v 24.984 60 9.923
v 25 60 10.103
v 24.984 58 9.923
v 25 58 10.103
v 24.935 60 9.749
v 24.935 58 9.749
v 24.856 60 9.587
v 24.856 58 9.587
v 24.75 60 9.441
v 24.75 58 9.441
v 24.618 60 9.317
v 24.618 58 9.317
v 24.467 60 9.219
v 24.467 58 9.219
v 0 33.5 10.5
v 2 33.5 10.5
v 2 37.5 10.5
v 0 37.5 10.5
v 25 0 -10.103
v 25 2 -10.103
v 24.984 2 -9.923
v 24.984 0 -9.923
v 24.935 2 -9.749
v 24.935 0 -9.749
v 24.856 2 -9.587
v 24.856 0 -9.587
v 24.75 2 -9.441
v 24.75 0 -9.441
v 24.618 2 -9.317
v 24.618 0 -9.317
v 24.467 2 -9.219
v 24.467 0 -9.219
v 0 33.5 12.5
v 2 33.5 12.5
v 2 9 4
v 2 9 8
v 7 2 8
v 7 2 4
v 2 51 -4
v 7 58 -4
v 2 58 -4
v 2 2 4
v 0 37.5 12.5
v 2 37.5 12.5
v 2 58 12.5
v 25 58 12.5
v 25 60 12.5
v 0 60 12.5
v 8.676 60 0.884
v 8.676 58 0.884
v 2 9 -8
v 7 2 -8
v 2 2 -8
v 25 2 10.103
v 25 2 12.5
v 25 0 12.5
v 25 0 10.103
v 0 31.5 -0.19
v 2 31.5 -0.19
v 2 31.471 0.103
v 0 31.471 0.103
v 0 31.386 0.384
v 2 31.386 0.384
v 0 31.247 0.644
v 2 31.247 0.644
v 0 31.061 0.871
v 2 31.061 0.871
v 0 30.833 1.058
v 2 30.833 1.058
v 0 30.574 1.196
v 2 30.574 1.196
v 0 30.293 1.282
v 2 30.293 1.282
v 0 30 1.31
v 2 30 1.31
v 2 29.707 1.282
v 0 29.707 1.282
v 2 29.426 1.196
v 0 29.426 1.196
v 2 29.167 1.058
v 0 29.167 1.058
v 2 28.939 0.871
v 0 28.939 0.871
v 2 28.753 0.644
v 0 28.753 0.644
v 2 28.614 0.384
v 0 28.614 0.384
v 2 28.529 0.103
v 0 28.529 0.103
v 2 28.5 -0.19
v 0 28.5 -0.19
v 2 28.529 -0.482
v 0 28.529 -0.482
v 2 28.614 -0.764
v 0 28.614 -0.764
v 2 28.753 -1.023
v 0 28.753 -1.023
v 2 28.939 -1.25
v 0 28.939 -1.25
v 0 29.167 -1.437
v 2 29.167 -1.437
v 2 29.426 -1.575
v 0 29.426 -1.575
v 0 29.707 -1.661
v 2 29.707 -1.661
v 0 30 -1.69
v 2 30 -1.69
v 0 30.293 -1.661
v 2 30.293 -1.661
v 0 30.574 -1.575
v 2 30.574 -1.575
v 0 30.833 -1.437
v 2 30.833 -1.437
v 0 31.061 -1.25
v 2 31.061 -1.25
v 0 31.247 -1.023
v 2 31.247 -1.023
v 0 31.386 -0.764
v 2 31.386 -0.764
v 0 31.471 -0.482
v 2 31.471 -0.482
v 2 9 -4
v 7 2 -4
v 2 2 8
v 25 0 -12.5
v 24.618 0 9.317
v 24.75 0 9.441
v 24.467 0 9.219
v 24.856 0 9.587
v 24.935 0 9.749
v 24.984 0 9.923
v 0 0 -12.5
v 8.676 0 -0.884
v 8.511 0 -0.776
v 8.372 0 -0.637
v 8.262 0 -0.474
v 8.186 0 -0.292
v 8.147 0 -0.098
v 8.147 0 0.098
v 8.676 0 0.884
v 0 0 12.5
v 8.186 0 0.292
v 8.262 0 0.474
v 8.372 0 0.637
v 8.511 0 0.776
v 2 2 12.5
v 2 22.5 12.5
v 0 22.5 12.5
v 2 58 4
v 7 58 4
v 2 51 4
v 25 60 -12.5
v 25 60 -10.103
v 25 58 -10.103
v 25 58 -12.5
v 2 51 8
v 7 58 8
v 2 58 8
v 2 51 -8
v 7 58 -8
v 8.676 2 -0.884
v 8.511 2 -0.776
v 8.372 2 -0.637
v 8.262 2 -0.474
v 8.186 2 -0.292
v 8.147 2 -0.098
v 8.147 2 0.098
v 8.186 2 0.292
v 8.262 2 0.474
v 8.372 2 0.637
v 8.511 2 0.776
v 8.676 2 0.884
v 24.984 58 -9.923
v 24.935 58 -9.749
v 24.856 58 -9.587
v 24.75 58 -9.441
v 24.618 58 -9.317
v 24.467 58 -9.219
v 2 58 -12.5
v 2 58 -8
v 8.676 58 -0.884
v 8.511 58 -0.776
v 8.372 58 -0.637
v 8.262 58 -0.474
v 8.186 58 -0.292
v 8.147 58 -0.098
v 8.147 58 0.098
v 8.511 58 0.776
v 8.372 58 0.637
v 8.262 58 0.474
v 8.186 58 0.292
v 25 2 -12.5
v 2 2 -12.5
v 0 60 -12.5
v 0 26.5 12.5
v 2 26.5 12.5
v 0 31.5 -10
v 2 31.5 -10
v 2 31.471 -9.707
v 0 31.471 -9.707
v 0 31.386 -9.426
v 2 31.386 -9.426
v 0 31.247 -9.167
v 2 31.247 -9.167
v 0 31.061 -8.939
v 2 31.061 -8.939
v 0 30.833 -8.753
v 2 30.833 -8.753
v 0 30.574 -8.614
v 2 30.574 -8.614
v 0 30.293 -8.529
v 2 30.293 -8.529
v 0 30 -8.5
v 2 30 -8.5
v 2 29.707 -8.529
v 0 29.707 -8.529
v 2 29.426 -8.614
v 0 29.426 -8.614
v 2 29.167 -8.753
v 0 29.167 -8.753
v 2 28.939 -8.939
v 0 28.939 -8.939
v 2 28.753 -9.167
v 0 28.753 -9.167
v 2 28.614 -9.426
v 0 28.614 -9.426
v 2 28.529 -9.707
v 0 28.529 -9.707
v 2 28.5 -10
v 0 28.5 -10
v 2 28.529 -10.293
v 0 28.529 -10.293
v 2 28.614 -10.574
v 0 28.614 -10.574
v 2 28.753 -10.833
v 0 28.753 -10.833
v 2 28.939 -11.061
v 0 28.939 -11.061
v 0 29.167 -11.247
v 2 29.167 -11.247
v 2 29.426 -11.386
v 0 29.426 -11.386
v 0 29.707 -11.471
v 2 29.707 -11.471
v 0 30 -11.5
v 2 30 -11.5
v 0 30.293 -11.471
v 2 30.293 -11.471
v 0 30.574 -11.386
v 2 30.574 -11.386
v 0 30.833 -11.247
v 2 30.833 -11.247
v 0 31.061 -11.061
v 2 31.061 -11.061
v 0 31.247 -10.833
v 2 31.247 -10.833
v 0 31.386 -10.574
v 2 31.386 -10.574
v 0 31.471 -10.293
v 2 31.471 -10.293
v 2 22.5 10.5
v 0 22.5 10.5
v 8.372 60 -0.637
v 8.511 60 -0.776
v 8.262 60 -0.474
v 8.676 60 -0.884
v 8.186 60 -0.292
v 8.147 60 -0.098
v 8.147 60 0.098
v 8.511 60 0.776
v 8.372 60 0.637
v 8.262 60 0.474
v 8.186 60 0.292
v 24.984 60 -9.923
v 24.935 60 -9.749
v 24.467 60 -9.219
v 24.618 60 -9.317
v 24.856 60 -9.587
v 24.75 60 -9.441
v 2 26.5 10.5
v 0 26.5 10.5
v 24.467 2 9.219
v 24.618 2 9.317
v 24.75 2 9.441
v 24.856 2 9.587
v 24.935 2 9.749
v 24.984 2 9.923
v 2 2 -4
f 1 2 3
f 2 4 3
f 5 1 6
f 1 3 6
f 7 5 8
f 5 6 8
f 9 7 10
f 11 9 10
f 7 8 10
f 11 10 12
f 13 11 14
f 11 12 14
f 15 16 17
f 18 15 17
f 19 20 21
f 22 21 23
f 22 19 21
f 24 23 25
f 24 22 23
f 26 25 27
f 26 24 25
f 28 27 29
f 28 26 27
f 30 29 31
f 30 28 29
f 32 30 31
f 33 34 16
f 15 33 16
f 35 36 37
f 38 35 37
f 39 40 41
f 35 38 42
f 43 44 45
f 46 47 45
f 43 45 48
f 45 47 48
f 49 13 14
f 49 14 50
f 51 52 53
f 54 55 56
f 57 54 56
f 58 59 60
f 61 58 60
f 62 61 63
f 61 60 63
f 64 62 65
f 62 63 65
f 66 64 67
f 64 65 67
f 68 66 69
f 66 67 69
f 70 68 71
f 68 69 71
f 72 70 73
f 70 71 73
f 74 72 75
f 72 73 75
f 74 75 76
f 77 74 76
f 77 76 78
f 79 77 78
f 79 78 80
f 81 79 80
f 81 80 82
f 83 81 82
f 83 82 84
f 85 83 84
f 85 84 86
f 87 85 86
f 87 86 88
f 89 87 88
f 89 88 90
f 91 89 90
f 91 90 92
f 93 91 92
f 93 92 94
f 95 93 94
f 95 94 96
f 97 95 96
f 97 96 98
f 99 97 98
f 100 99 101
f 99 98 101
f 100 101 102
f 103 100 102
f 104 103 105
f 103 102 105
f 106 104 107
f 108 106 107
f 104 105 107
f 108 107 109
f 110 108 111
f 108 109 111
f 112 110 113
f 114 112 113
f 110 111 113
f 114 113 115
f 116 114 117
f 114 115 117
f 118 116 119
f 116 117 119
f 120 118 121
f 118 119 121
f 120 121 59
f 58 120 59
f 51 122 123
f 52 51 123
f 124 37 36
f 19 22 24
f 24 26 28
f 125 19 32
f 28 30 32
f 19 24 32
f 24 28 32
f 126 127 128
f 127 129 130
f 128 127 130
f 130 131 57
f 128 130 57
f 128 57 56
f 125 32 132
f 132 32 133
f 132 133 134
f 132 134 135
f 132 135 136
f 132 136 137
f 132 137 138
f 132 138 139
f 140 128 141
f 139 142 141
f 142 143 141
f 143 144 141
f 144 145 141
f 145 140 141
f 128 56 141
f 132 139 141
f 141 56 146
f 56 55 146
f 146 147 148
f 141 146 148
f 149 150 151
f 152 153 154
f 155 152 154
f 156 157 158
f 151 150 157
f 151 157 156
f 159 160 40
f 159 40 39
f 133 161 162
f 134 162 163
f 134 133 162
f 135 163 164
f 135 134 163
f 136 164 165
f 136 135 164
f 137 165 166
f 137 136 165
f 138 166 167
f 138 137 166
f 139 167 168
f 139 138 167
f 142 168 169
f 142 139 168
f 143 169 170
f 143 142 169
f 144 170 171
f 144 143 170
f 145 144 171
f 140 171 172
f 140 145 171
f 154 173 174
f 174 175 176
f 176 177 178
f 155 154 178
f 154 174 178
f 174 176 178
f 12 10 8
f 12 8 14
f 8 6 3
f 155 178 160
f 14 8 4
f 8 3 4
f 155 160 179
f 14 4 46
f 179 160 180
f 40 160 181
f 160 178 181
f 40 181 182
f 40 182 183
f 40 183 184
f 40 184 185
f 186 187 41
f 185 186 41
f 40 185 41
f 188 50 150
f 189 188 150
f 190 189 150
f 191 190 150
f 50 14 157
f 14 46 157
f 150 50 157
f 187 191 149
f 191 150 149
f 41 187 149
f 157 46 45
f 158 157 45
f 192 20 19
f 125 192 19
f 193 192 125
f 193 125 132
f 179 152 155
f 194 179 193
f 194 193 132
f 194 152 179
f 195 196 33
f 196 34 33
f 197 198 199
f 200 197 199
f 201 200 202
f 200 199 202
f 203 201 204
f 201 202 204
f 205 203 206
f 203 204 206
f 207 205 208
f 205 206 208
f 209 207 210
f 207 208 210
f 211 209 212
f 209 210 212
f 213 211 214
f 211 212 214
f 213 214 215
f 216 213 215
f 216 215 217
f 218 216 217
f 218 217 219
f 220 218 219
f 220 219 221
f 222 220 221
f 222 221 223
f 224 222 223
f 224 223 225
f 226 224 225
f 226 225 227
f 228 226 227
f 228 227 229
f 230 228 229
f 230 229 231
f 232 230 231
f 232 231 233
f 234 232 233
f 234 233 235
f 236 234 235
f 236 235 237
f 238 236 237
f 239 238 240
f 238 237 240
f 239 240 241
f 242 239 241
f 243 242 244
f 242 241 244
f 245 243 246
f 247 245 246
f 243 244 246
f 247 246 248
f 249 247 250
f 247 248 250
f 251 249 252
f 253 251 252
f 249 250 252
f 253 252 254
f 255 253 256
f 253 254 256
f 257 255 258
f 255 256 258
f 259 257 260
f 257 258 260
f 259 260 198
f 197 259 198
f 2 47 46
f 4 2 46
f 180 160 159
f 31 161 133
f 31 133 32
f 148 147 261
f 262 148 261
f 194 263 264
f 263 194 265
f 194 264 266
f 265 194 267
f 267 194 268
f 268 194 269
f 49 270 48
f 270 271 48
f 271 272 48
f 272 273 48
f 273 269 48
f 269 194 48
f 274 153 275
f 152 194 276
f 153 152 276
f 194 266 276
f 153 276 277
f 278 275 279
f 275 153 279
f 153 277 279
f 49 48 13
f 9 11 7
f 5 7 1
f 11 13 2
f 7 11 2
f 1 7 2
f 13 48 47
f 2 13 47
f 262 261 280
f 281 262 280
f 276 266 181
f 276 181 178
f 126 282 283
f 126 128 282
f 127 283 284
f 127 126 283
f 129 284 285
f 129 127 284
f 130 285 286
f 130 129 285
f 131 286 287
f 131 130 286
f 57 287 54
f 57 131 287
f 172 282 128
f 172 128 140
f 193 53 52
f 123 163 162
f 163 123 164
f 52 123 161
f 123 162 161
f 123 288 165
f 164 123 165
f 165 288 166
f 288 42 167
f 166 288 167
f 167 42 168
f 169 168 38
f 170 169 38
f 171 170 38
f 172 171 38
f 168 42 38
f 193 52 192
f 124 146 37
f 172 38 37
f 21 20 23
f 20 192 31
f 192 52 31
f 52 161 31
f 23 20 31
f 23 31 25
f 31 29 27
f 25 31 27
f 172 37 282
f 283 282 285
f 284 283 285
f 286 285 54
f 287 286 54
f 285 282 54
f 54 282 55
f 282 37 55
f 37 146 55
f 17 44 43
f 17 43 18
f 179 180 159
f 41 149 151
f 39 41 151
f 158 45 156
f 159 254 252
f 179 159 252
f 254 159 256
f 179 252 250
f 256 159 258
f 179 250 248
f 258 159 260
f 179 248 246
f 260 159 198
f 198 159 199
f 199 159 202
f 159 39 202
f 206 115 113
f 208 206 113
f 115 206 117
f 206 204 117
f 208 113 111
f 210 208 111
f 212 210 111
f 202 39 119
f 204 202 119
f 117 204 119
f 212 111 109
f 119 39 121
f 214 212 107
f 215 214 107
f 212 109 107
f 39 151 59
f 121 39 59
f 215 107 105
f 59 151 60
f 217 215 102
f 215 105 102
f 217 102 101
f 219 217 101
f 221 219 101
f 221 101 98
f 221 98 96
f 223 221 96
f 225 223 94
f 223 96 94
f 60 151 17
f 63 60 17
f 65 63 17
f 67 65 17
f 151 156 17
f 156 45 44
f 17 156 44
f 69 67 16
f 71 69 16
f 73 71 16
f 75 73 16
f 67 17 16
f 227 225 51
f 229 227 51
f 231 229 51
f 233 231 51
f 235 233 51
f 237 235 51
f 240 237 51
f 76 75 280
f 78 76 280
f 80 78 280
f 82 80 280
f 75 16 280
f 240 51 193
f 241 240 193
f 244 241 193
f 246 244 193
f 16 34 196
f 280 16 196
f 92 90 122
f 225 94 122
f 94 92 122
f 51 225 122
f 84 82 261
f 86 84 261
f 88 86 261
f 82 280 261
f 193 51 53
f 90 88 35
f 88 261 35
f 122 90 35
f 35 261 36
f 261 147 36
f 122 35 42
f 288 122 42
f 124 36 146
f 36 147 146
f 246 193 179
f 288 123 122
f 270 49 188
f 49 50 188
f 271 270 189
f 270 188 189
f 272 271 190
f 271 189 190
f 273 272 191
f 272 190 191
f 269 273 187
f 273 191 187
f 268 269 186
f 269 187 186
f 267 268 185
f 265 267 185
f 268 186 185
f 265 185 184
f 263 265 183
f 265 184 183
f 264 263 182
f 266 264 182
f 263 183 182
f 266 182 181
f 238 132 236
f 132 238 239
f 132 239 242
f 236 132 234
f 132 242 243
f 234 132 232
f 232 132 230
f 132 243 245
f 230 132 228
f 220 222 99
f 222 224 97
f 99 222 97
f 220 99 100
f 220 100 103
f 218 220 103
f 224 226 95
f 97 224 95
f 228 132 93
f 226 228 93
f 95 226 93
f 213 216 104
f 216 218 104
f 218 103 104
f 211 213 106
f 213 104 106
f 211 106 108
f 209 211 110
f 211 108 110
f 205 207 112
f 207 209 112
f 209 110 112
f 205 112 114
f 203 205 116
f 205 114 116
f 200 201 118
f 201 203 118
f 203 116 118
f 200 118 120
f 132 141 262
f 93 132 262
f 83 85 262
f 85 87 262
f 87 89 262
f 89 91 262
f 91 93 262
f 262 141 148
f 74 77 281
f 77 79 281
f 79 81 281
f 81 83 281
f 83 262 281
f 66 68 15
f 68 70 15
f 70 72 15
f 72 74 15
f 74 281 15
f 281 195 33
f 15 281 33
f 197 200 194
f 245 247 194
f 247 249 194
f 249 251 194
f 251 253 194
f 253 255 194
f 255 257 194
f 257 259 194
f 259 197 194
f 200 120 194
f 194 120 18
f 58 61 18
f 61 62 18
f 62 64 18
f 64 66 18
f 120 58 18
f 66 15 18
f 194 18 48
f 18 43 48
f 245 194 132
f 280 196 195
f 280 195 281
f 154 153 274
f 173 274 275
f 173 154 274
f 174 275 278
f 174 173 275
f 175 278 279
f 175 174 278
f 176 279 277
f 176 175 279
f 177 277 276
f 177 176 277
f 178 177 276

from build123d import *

# Parameters (mm, degrees)
BOSS_EXTRUDE2_DEPTH = 12.5
CUT_EXTRUDE1_DEPTH  = 67.191011474
FILLET1_R           = 1
SKETCH7_R           = 1.5
CUT_EXTRUDE2_DEPTH  = 10
BOSS_EXTRUDE8_DEPTH = 8
CUT_EXTRUDE4_DEPTH  = 4
SKETCH15_W          = 2
SKETCH15_H          = 4
CUT_EXTRUDE5_DEPTH  = 2


with BuildPart() as part:
    # Sketch1 → Boss-Extrude2 (new, symmetric)
    with BuildSketch(Plane.XY):
        Polygon((0, 0), (0, 60), (25, 60), (25, 58), (2, 58), (2, 2), (25, 2), (25, 0), align=None)
    extrude(amount=BOSS_EXTRUDE2_DEPTH, both=True)

    # Sketch6 → Cut-Extrude1 (cut, through all)
    with BuildSketch(Plane(origin=(0, 60, 0), x_dir=(1, 0, 0), z_dir=(0, 1, 0))):
        Polygon((7, 0), (25, 9.5), (25, -9.5), align=None)
    extrude(amount=-CUT_EXTRUDE1_DEPTH, mode=Mode.SUBTRACT)

    # Fillet1
    fillet1_edges = [part.edges().sort_by_distance(p)[0] for p in [
        (25, 1, 9.5),
        (25, 59, 9.5),
        (7, 1, 0),
        (7, 59, 0),
        (25, 1, -9.5),
        (25, 59, -9.5),
    ]]
    fillet(fillet1_edges, radius=FILLET1_R)

    # Sketch7 → Cut-Extrude2 (cut)
    with BuildSketch(Plane(origin=(2, 0, 0), x_dir=(0, 0, -1), z_dir=(1, 0, 0))):
        with Locations(Location((0.18959721, 30, 0), (0, 0, 90))):
            Circle(SKETCH7_R)
        with Locations(Location((10, 30, 0), (0, 0, 90))):
            Circle(SKETCH7_R)
    extrude(amount=-CUT_EXTRUDE2_DEPTH, mode=Mode.SUBTRACT)

    # Sketch13 → Boss-Extrude8 (add, symmetric)
    with BuildSketch(Plane.XY):
        Polygon((2, 58), (7, 58), (2, 51), align=None)
        Polygon((7, 2), (2, 2), (2, 9), align=None)
    extrude(amount=BOSS_EXTRUDE8_DEPTH, both=True)

    # Sketch14 → Cut-Extrude4 (cut, symmetric)
    with BuildSketch(Plane.XY):
        Polygon((2, 2), (2, 9), (7, 2), align=None)
        Polygon((2, 58), (7, 58), (2, 51), align=None)
    extrude(amount=CUT_EXTRUDE4_DEPTH, both=True, mode=Mode.SUBTRACT)

    # Sketch15 → Cut-Extrude5 (cut)
    with BuildSketch(Plane(origin=(2, 0, 0), x_dir=(0, 0, -1), z_dir=(1, 0, 0))):
        with Locations((-11.5, 35.5)):
            Rectangle(SKETCH15_W, SKETCH15_H)
        with Locations((-11.5, 24.5)):
            Rectangle(SKETCH15_W, SKETCH15_H)
    extrude(amount=-CUT_EXTRUDE5_DEPTH, mode=Mode.SUBTRACT)


solid = part.part
